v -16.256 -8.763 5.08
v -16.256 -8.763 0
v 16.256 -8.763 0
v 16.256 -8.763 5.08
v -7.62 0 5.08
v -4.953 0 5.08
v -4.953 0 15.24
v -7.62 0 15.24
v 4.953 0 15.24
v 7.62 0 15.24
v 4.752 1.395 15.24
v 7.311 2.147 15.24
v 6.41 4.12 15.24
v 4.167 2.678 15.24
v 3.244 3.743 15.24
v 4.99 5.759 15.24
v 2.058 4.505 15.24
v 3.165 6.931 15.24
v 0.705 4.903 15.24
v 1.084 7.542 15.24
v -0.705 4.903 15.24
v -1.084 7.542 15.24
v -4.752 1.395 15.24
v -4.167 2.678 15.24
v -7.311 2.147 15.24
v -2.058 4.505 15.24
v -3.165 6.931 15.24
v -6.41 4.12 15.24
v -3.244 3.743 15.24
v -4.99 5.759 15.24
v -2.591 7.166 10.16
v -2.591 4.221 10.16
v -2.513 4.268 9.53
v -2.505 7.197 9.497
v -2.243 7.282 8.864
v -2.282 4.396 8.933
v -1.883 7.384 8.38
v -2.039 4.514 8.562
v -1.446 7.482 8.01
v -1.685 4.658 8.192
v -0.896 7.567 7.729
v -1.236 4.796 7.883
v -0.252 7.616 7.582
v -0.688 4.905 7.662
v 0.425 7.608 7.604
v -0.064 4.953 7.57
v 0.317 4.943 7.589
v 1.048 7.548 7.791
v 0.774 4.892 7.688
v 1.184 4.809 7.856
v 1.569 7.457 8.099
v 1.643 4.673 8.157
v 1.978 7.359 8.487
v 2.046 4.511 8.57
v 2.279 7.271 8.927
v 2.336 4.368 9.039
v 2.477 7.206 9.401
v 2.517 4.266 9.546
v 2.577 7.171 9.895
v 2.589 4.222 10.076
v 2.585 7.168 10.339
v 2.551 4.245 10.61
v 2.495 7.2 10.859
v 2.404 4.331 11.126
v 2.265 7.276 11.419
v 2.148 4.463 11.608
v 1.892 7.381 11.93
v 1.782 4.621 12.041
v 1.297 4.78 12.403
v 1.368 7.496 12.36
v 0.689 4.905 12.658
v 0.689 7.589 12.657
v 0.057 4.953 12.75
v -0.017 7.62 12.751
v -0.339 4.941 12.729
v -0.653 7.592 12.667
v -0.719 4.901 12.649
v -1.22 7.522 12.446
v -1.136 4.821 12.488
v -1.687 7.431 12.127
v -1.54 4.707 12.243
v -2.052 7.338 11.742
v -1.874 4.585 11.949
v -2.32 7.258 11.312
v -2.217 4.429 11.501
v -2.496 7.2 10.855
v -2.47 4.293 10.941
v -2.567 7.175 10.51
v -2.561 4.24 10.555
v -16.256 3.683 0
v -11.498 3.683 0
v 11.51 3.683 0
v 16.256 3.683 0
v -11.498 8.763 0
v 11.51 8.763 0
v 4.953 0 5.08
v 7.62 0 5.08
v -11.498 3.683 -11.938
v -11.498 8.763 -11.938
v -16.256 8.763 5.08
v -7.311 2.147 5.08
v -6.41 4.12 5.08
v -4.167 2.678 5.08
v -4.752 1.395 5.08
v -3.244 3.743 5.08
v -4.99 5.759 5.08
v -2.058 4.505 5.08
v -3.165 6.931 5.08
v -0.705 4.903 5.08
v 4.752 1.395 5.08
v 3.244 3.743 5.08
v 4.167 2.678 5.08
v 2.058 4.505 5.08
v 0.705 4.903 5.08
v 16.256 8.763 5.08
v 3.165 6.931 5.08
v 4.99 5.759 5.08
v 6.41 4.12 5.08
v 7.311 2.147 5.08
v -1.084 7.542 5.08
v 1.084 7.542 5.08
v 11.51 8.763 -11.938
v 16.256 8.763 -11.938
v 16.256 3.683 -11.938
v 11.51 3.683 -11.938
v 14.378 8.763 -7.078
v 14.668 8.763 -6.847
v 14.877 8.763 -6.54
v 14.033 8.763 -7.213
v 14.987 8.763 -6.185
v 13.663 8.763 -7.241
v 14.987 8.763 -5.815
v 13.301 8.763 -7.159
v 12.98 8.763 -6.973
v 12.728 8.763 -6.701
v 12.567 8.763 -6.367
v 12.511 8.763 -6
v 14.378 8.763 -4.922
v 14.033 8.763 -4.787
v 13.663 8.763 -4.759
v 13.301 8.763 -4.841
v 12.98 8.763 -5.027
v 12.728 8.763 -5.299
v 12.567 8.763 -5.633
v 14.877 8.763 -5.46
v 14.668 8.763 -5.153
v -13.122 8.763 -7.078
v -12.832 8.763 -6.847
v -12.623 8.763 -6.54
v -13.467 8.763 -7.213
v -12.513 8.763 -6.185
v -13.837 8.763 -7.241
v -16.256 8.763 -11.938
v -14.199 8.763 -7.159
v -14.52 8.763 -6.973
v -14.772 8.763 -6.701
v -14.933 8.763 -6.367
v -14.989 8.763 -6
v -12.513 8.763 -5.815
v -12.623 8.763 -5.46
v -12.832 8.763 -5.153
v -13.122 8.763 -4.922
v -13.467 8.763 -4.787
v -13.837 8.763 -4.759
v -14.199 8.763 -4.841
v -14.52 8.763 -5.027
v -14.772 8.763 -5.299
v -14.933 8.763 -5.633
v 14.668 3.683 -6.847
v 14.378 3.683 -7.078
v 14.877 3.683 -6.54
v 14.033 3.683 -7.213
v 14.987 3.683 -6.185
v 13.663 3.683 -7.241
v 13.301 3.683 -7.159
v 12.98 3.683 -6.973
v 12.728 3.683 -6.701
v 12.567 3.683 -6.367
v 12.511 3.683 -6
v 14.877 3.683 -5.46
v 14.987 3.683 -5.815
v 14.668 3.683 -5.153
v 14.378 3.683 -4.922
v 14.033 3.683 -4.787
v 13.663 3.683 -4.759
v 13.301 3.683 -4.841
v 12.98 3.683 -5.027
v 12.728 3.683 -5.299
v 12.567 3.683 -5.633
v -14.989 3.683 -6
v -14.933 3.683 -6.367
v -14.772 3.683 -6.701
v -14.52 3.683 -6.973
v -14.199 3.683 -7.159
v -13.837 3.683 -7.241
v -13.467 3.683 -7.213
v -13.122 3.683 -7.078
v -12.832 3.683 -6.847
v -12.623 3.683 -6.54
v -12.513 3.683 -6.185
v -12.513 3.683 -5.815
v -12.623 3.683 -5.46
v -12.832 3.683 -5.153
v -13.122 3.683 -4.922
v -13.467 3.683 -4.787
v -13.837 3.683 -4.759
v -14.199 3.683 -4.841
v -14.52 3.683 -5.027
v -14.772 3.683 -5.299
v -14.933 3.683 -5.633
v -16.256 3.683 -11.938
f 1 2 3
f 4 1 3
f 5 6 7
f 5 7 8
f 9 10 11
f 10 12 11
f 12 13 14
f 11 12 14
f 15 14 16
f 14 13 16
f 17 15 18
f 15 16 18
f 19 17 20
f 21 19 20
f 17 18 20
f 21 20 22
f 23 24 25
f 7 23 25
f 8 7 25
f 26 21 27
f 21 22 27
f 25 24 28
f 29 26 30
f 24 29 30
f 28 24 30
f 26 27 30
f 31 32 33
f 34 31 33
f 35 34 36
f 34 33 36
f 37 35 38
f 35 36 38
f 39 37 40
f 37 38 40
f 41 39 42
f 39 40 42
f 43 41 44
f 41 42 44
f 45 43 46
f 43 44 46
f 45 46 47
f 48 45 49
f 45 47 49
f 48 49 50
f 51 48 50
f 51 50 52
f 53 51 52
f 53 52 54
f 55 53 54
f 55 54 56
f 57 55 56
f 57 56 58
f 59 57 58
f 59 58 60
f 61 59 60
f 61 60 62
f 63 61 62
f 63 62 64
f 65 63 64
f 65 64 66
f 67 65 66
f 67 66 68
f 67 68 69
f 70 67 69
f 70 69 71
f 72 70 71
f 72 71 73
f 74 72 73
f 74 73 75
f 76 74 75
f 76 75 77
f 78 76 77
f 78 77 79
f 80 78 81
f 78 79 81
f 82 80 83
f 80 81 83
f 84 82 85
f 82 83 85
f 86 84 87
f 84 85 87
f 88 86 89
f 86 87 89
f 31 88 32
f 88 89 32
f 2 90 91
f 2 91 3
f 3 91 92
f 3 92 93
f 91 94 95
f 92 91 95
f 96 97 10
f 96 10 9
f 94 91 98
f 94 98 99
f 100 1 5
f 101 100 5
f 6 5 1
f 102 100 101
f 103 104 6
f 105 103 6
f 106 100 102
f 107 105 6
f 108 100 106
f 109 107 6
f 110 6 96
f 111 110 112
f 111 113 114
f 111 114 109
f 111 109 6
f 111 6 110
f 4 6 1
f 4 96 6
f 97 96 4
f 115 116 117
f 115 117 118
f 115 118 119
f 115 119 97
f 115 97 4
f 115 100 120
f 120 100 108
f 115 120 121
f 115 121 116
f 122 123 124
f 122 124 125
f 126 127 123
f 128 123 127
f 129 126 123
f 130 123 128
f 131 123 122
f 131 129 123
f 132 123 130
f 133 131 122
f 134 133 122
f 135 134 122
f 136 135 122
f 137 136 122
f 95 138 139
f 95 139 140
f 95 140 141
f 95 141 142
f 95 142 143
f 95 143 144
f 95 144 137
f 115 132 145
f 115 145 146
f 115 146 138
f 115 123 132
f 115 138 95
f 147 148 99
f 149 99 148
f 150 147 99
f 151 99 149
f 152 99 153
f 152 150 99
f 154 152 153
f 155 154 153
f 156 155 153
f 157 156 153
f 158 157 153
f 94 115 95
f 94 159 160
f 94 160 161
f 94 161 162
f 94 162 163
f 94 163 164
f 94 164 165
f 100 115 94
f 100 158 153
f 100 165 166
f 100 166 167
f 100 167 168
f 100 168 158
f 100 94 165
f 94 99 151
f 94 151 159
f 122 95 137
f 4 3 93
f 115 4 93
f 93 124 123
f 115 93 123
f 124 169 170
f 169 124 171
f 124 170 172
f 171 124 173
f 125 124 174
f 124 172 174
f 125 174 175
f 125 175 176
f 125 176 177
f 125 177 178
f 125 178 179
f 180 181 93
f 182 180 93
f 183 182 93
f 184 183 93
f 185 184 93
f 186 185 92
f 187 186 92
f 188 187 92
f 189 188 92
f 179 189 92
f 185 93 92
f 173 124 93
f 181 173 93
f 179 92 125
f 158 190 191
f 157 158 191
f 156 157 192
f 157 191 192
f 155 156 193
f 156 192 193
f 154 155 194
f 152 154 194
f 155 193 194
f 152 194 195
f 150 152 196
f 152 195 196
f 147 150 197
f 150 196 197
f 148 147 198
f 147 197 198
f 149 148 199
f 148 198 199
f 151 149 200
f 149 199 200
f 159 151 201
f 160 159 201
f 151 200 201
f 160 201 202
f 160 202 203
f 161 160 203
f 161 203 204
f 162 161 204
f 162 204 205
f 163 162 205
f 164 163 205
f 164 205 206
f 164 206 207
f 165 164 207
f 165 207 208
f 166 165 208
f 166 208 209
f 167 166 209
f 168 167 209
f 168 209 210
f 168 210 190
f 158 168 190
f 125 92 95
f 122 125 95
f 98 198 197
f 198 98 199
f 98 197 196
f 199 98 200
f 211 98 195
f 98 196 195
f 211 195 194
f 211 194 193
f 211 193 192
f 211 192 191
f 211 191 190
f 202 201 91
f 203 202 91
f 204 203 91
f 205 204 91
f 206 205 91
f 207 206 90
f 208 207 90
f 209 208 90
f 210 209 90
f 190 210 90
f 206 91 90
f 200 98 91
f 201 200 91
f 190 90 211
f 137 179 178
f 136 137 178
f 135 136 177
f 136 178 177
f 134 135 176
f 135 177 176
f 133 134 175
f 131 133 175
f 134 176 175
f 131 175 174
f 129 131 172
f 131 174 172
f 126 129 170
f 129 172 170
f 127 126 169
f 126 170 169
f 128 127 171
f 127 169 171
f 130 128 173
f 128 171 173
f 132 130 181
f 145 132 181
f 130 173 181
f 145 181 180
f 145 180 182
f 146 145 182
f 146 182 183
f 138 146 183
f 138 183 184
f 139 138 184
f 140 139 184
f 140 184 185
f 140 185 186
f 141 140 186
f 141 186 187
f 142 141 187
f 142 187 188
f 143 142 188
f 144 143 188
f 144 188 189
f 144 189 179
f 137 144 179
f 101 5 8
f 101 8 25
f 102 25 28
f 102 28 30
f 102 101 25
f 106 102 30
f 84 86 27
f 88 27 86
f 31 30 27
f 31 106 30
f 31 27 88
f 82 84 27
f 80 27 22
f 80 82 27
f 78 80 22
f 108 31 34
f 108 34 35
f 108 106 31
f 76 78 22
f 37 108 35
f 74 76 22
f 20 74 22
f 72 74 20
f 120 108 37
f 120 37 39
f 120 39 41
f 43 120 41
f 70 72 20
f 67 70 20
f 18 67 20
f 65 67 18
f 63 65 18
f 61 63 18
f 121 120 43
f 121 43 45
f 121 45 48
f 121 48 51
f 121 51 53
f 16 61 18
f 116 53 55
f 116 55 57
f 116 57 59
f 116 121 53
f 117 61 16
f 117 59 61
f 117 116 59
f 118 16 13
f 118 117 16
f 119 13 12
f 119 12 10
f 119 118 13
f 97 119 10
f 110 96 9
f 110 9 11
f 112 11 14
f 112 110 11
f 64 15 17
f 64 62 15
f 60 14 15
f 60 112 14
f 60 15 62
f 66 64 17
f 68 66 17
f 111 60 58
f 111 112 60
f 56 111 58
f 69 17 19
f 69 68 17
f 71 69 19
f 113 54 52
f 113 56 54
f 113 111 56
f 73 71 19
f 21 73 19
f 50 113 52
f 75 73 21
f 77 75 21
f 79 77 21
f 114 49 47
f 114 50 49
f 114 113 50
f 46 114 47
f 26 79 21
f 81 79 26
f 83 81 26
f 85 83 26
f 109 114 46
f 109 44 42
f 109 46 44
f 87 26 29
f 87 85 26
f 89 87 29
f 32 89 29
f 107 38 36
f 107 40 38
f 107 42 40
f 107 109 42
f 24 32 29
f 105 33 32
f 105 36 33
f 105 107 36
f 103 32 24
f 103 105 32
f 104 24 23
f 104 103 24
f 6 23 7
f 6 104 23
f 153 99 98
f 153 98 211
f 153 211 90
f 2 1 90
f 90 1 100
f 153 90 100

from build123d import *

# Parameters (mm, degrees)
SKETCH1_W                   = 32.512
SKETCH1_H                   = 17.526
BOSS_EXTRUDE1_DEPTH         = 5.08
SKETCH2_W                   = 4.758
SKETCH2_H                   = 5.08
SKETCH2_W_2                 = 4.746
BOSS_EXTRUDE2_DEPTH         = 11.938
F_40_0_098_DIAMETER_HOLE1_D = 2.4892
BOSS_EXTRUDE3_DEPTH         = 10.16
F_6_0_204_DIAMETER_HOLE2_D  = 5.1816


with BuildPart() as part:
    # Sketch1 → Boss-Extrude1 (new body)
    with BuildSketch(Plane.XY):
        Rectangle(SKETCH1_W, SKETCH1_H)
    extrude(amount=BOSS_EXTRUDE1_DEPTH)

    # Sketch2 → Boss-Extrude2 (add)
    with BuildSketch(Plane(origin=(0, 0, 0), x_dir=(-1, 0, 0), z_dir=(0, 0, -1))):
        with Locations((13.877, 6.223)):
            Rectangle(SKETCH2_W, SKETCH2_H)
        with Locations((-13.883, 6.223)):
            Rectangle(SKETCH2_W_2, SKETCH2_H)
    extrude(amount=BOSS_EXTRUDE2_DEPTH)

    # #40 (0.098) Diameter Hole1 (through all)
    with Locations(Plane(origin=(0, 8.763, 0), x_dir=(1, 0, 0), z_dir=(0, 1, 0))):
        with Locations((-13.744, 6), (13.756, 6)):
            Hole(F_40_0_098_DIAMETER_HOLE1_D / 2)

    # Sketch5 → Boss-Extrude3 (add)
    with BuildSketch(Plane.XY.offset(5.08)):
        with BuildLine():
            Line((7.62, 0), (4.953, 0))
            ThreePointArc((4.953, 0), (0, 4.953), (-4.953, 0))
            Line((-4.953, 0), (-7.62, 0))
            ThreePointArc((-7.62, 0), (0, 7.62), (7.62, 0))
        make_face()
    extrude(amount=BOSS_EXTRUDE3_DEPTH)

    # #6 (0.204) Diameter Hole2 (through all)
    with Locations(Plane(origin=(0, 7.62, 0), x_dir=(1, 0, 0), z_dir=(0, 1, 0))):
        with Locations((0, -10.16)):
            Hole(F_6_0_204_DIAMETER_HOLE2_D / 2)


solid = part.part
